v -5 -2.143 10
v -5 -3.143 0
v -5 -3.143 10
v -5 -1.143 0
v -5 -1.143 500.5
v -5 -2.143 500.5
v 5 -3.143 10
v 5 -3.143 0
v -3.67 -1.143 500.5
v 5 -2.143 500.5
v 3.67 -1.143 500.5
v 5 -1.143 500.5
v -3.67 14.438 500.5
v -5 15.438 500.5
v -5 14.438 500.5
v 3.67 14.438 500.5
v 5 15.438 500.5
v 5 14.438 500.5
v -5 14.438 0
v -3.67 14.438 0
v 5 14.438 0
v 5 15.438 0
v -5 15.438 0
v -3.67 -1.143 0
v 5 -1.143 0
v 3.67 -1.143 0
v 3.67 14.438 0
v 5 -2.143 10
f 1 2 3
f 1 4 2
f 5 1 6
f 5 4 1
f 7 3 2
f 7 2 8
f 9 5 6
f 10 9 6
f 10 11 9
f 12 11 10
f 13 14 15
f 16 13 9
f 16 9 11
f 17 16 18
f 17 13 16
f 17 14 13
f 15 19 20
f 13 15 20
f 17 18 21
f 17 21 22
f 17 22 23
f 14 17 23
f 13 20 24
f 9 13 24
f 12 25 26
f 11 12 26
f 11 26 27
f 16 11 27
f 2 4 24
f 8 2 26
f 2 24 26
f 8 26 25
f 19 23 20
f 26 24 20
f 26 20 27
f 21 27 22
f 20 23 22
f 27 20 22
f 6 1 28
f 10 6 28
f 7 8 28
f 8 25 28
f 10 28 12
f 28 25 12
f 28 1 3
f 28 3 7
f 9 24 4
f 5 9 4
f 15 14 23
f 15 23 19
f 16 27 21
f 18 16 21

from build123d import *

# Parameters (mm, degrees)
F1_DEPTH = 500.5
F2_W     = 10
F2_H     = 10
F3_DEPTH = 1


with BuildPart() as f1:
    # F0 (on Top) → F1 (new body)
    with BuildSketch(Plane.XY):
        Polygon((5, 15.438399), (-5, 15.438399), (-5, 14.438399), (-3.67, 14.438399), (-3.67, -1.142601), (-5, -1.142601), (-5, -2.142601), (5, -2.142601), (5, -1.142601), (3.67, -1.142601), (3.67, 14.438399), (5, 14.438399), align=None)
    extrude(amount=F1_DEPTH)

    # F2 (on face) → F3 (join)
    with BuildSketch(Plane.XZ.offset(2.142601)):
        with Locations((0, 5)):
            Rectangle(F2_W, F2_H)
    extrude(amount=F3_DEPTH)


solid = f1.part
